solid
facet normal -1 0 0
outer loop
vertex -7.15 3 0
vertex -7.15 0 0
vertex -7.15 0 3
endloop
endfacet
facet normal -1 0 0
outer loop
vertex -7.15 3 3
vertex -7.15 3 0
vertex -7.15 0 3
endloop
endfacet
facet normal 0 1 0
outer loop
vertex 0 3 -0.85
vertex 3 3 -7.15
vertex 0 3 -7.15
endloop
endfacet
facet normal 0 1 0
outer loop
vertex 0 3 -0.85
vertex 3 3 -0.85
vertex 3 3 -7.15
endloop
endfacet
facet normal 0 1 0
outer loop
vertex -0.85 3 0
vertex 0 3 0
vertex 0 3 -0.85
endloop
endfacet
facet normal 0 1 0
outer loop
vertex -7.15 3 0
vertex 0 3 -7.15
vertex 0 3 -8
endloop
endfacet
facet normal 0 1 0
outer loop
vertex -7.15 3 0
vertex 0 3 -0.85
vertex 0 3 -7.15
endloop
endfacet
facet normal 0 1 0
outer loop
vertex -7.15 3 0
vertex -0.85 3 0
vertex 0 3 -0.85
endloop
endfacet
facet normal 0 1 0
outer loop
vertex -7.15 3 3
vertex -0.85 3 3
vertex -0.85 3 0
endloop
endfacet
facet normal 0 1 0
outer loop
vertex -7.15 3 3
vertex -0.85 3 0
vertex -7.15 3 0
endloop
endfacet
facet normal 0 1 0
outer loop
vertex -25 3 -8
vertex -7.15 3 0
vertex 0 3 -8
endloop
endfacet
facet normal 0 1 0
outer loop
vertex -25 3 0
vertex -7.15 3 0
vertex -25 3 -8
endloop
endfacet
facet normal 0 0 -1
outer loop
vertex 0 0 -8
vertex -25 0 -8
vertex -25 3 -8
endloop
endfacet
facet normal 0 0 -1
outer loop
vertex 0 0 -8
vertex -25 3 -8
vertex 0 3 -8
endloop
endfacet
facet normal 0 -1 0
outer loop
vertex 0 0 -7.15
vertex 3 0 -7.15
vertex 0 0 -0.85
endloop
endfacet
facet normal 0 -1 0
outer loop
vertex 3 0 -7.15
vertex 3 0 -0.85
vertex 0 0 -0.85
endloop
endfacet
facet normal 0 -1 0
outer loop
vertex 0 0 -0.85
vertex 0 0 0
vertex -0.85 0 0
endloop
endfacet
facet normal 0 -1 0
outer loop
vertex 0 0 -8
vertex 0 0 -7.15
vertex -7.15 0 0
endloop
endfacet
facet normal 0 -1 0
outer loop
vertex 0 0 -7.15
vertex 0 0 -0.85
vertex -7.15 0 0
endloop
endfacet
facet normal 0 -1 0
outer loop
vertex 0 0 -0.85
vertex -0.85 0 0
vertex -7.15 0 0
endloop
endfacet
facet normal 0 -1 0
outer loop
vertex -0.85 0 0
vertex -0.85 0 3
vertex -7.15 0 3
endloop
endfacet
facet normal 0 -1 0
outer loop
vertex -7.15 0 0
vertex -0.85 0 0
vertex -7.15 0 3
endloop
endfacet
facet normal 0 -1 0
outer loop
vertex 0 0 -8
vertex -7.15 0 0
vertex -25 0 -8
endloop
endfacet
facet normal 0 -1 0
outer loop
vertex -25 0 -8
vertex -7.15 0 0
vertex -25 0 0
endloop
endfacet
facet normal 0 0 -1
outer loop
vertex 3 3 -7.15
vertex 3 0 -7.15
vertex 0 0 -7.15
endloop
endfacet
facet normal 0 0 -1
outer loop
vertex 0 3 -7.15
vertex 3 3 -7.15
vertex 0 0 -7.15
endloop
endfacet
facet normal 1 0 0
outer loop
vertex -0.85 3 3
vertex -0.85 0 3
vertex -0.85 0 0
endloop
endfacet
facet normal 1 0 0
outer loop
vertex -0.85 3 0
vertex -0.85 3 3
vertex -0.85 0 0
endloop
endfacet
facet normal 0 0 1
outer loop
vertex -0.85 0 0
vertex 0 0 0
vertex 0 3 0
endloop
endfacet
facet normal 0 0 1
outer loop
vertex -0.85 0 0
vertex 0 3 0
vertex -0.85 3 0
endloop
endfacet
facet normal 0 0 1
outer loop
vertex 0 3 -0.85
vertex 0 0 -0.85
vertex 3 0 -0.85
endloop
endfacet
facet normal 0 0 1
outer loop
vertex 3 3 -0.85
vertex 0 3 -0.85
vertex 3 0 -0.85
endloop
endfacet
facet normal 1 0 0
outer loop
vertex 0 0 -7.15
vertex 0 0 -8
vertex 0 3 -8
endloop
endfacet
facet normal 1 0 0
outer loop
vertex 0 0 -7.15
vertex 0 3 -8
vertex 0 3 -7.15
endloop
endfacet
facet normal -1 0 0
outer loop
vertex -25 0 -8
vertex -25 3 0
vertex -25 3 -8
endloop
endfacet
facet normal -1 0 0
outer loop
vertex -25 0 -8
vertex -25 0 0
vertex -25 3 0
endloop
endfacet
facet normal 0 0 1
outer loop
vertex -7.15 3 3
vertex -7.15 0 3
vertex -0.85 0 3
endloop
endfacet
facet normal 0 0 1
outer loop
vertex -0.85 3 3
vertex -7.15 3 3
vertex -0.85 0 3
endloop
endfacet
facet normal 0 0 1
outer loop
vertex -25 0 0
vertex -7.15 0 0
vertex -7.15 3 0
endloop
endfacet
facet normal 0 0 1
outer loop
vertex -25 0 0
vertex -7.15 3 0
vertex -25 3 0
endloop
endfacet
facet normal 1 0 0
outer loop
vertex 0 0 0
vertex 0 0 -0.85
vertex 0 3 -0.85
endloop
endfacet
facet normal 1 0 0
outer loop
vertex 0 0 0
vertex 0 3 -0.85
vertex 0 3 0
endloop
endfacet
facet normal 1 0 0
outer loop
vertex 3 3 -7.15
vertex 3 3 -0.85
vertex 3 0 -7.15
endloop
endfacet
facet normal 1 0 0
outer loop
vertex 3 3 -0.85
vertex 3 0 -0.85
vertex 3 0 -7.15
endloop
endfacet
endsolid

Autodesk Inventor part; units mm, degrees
ref_plane "YZ Plane" through (0, 0, 0) normal (1, 0, 0) x (0, 1, 0)
ref_plane "XZ Plane" through (0, 0, 0) normal (0, 1, 0) x (-1, 0, 0)
ref_plane "XY Plane" through (0, 0, 0) normal (0, 0, 1) x (1, 0, 0)
sketch "草圖5" plane through (0, 0, 0) normal (0, 1, 0) x (-1, 0, 0)
  line L0 (7.15, 3) -> (0.85, 3)
  line L1 (0.85, 3) -> (0.85, 0)
  line L2 (0.85, 0) -> (7.15, 0)
  line L3 (7.15, 0) -> (7.15, 3)
  line L4 (0, -0.85) -> (-3, -0.85)
  line L5 (-3, -0.85) -> (-3, -7.15)
  line L6 (-3, -7.15) -> (0, -7.15)
  line L7 (0, -7.15) -> (0, -0.85)
  line L8 (0, 0) -> (25, 0)
  line L9 (25, 0) -> (25, -8)
  line L10 (25, -8) -> (0, -8)
  line L11 (0, -8) -> (0, 0)
  point P0 (7.15, 0)
  dimension "d17" = 0.85
  dimension "d18" = 0.85
  dimension "d19" = 3
  dimension "d20" = 6.3
  dimension "d21" = 6.3
  dimension "d22" = 25
  dimension "d23" = 8
  dimension "d24" = 3
extrude "擠出3" add sketch "草圖5" along normal blind 3
equation "\"d18\" = d17"
equation "\"d20\" = d21"
properties part number "chassis_1_4"
